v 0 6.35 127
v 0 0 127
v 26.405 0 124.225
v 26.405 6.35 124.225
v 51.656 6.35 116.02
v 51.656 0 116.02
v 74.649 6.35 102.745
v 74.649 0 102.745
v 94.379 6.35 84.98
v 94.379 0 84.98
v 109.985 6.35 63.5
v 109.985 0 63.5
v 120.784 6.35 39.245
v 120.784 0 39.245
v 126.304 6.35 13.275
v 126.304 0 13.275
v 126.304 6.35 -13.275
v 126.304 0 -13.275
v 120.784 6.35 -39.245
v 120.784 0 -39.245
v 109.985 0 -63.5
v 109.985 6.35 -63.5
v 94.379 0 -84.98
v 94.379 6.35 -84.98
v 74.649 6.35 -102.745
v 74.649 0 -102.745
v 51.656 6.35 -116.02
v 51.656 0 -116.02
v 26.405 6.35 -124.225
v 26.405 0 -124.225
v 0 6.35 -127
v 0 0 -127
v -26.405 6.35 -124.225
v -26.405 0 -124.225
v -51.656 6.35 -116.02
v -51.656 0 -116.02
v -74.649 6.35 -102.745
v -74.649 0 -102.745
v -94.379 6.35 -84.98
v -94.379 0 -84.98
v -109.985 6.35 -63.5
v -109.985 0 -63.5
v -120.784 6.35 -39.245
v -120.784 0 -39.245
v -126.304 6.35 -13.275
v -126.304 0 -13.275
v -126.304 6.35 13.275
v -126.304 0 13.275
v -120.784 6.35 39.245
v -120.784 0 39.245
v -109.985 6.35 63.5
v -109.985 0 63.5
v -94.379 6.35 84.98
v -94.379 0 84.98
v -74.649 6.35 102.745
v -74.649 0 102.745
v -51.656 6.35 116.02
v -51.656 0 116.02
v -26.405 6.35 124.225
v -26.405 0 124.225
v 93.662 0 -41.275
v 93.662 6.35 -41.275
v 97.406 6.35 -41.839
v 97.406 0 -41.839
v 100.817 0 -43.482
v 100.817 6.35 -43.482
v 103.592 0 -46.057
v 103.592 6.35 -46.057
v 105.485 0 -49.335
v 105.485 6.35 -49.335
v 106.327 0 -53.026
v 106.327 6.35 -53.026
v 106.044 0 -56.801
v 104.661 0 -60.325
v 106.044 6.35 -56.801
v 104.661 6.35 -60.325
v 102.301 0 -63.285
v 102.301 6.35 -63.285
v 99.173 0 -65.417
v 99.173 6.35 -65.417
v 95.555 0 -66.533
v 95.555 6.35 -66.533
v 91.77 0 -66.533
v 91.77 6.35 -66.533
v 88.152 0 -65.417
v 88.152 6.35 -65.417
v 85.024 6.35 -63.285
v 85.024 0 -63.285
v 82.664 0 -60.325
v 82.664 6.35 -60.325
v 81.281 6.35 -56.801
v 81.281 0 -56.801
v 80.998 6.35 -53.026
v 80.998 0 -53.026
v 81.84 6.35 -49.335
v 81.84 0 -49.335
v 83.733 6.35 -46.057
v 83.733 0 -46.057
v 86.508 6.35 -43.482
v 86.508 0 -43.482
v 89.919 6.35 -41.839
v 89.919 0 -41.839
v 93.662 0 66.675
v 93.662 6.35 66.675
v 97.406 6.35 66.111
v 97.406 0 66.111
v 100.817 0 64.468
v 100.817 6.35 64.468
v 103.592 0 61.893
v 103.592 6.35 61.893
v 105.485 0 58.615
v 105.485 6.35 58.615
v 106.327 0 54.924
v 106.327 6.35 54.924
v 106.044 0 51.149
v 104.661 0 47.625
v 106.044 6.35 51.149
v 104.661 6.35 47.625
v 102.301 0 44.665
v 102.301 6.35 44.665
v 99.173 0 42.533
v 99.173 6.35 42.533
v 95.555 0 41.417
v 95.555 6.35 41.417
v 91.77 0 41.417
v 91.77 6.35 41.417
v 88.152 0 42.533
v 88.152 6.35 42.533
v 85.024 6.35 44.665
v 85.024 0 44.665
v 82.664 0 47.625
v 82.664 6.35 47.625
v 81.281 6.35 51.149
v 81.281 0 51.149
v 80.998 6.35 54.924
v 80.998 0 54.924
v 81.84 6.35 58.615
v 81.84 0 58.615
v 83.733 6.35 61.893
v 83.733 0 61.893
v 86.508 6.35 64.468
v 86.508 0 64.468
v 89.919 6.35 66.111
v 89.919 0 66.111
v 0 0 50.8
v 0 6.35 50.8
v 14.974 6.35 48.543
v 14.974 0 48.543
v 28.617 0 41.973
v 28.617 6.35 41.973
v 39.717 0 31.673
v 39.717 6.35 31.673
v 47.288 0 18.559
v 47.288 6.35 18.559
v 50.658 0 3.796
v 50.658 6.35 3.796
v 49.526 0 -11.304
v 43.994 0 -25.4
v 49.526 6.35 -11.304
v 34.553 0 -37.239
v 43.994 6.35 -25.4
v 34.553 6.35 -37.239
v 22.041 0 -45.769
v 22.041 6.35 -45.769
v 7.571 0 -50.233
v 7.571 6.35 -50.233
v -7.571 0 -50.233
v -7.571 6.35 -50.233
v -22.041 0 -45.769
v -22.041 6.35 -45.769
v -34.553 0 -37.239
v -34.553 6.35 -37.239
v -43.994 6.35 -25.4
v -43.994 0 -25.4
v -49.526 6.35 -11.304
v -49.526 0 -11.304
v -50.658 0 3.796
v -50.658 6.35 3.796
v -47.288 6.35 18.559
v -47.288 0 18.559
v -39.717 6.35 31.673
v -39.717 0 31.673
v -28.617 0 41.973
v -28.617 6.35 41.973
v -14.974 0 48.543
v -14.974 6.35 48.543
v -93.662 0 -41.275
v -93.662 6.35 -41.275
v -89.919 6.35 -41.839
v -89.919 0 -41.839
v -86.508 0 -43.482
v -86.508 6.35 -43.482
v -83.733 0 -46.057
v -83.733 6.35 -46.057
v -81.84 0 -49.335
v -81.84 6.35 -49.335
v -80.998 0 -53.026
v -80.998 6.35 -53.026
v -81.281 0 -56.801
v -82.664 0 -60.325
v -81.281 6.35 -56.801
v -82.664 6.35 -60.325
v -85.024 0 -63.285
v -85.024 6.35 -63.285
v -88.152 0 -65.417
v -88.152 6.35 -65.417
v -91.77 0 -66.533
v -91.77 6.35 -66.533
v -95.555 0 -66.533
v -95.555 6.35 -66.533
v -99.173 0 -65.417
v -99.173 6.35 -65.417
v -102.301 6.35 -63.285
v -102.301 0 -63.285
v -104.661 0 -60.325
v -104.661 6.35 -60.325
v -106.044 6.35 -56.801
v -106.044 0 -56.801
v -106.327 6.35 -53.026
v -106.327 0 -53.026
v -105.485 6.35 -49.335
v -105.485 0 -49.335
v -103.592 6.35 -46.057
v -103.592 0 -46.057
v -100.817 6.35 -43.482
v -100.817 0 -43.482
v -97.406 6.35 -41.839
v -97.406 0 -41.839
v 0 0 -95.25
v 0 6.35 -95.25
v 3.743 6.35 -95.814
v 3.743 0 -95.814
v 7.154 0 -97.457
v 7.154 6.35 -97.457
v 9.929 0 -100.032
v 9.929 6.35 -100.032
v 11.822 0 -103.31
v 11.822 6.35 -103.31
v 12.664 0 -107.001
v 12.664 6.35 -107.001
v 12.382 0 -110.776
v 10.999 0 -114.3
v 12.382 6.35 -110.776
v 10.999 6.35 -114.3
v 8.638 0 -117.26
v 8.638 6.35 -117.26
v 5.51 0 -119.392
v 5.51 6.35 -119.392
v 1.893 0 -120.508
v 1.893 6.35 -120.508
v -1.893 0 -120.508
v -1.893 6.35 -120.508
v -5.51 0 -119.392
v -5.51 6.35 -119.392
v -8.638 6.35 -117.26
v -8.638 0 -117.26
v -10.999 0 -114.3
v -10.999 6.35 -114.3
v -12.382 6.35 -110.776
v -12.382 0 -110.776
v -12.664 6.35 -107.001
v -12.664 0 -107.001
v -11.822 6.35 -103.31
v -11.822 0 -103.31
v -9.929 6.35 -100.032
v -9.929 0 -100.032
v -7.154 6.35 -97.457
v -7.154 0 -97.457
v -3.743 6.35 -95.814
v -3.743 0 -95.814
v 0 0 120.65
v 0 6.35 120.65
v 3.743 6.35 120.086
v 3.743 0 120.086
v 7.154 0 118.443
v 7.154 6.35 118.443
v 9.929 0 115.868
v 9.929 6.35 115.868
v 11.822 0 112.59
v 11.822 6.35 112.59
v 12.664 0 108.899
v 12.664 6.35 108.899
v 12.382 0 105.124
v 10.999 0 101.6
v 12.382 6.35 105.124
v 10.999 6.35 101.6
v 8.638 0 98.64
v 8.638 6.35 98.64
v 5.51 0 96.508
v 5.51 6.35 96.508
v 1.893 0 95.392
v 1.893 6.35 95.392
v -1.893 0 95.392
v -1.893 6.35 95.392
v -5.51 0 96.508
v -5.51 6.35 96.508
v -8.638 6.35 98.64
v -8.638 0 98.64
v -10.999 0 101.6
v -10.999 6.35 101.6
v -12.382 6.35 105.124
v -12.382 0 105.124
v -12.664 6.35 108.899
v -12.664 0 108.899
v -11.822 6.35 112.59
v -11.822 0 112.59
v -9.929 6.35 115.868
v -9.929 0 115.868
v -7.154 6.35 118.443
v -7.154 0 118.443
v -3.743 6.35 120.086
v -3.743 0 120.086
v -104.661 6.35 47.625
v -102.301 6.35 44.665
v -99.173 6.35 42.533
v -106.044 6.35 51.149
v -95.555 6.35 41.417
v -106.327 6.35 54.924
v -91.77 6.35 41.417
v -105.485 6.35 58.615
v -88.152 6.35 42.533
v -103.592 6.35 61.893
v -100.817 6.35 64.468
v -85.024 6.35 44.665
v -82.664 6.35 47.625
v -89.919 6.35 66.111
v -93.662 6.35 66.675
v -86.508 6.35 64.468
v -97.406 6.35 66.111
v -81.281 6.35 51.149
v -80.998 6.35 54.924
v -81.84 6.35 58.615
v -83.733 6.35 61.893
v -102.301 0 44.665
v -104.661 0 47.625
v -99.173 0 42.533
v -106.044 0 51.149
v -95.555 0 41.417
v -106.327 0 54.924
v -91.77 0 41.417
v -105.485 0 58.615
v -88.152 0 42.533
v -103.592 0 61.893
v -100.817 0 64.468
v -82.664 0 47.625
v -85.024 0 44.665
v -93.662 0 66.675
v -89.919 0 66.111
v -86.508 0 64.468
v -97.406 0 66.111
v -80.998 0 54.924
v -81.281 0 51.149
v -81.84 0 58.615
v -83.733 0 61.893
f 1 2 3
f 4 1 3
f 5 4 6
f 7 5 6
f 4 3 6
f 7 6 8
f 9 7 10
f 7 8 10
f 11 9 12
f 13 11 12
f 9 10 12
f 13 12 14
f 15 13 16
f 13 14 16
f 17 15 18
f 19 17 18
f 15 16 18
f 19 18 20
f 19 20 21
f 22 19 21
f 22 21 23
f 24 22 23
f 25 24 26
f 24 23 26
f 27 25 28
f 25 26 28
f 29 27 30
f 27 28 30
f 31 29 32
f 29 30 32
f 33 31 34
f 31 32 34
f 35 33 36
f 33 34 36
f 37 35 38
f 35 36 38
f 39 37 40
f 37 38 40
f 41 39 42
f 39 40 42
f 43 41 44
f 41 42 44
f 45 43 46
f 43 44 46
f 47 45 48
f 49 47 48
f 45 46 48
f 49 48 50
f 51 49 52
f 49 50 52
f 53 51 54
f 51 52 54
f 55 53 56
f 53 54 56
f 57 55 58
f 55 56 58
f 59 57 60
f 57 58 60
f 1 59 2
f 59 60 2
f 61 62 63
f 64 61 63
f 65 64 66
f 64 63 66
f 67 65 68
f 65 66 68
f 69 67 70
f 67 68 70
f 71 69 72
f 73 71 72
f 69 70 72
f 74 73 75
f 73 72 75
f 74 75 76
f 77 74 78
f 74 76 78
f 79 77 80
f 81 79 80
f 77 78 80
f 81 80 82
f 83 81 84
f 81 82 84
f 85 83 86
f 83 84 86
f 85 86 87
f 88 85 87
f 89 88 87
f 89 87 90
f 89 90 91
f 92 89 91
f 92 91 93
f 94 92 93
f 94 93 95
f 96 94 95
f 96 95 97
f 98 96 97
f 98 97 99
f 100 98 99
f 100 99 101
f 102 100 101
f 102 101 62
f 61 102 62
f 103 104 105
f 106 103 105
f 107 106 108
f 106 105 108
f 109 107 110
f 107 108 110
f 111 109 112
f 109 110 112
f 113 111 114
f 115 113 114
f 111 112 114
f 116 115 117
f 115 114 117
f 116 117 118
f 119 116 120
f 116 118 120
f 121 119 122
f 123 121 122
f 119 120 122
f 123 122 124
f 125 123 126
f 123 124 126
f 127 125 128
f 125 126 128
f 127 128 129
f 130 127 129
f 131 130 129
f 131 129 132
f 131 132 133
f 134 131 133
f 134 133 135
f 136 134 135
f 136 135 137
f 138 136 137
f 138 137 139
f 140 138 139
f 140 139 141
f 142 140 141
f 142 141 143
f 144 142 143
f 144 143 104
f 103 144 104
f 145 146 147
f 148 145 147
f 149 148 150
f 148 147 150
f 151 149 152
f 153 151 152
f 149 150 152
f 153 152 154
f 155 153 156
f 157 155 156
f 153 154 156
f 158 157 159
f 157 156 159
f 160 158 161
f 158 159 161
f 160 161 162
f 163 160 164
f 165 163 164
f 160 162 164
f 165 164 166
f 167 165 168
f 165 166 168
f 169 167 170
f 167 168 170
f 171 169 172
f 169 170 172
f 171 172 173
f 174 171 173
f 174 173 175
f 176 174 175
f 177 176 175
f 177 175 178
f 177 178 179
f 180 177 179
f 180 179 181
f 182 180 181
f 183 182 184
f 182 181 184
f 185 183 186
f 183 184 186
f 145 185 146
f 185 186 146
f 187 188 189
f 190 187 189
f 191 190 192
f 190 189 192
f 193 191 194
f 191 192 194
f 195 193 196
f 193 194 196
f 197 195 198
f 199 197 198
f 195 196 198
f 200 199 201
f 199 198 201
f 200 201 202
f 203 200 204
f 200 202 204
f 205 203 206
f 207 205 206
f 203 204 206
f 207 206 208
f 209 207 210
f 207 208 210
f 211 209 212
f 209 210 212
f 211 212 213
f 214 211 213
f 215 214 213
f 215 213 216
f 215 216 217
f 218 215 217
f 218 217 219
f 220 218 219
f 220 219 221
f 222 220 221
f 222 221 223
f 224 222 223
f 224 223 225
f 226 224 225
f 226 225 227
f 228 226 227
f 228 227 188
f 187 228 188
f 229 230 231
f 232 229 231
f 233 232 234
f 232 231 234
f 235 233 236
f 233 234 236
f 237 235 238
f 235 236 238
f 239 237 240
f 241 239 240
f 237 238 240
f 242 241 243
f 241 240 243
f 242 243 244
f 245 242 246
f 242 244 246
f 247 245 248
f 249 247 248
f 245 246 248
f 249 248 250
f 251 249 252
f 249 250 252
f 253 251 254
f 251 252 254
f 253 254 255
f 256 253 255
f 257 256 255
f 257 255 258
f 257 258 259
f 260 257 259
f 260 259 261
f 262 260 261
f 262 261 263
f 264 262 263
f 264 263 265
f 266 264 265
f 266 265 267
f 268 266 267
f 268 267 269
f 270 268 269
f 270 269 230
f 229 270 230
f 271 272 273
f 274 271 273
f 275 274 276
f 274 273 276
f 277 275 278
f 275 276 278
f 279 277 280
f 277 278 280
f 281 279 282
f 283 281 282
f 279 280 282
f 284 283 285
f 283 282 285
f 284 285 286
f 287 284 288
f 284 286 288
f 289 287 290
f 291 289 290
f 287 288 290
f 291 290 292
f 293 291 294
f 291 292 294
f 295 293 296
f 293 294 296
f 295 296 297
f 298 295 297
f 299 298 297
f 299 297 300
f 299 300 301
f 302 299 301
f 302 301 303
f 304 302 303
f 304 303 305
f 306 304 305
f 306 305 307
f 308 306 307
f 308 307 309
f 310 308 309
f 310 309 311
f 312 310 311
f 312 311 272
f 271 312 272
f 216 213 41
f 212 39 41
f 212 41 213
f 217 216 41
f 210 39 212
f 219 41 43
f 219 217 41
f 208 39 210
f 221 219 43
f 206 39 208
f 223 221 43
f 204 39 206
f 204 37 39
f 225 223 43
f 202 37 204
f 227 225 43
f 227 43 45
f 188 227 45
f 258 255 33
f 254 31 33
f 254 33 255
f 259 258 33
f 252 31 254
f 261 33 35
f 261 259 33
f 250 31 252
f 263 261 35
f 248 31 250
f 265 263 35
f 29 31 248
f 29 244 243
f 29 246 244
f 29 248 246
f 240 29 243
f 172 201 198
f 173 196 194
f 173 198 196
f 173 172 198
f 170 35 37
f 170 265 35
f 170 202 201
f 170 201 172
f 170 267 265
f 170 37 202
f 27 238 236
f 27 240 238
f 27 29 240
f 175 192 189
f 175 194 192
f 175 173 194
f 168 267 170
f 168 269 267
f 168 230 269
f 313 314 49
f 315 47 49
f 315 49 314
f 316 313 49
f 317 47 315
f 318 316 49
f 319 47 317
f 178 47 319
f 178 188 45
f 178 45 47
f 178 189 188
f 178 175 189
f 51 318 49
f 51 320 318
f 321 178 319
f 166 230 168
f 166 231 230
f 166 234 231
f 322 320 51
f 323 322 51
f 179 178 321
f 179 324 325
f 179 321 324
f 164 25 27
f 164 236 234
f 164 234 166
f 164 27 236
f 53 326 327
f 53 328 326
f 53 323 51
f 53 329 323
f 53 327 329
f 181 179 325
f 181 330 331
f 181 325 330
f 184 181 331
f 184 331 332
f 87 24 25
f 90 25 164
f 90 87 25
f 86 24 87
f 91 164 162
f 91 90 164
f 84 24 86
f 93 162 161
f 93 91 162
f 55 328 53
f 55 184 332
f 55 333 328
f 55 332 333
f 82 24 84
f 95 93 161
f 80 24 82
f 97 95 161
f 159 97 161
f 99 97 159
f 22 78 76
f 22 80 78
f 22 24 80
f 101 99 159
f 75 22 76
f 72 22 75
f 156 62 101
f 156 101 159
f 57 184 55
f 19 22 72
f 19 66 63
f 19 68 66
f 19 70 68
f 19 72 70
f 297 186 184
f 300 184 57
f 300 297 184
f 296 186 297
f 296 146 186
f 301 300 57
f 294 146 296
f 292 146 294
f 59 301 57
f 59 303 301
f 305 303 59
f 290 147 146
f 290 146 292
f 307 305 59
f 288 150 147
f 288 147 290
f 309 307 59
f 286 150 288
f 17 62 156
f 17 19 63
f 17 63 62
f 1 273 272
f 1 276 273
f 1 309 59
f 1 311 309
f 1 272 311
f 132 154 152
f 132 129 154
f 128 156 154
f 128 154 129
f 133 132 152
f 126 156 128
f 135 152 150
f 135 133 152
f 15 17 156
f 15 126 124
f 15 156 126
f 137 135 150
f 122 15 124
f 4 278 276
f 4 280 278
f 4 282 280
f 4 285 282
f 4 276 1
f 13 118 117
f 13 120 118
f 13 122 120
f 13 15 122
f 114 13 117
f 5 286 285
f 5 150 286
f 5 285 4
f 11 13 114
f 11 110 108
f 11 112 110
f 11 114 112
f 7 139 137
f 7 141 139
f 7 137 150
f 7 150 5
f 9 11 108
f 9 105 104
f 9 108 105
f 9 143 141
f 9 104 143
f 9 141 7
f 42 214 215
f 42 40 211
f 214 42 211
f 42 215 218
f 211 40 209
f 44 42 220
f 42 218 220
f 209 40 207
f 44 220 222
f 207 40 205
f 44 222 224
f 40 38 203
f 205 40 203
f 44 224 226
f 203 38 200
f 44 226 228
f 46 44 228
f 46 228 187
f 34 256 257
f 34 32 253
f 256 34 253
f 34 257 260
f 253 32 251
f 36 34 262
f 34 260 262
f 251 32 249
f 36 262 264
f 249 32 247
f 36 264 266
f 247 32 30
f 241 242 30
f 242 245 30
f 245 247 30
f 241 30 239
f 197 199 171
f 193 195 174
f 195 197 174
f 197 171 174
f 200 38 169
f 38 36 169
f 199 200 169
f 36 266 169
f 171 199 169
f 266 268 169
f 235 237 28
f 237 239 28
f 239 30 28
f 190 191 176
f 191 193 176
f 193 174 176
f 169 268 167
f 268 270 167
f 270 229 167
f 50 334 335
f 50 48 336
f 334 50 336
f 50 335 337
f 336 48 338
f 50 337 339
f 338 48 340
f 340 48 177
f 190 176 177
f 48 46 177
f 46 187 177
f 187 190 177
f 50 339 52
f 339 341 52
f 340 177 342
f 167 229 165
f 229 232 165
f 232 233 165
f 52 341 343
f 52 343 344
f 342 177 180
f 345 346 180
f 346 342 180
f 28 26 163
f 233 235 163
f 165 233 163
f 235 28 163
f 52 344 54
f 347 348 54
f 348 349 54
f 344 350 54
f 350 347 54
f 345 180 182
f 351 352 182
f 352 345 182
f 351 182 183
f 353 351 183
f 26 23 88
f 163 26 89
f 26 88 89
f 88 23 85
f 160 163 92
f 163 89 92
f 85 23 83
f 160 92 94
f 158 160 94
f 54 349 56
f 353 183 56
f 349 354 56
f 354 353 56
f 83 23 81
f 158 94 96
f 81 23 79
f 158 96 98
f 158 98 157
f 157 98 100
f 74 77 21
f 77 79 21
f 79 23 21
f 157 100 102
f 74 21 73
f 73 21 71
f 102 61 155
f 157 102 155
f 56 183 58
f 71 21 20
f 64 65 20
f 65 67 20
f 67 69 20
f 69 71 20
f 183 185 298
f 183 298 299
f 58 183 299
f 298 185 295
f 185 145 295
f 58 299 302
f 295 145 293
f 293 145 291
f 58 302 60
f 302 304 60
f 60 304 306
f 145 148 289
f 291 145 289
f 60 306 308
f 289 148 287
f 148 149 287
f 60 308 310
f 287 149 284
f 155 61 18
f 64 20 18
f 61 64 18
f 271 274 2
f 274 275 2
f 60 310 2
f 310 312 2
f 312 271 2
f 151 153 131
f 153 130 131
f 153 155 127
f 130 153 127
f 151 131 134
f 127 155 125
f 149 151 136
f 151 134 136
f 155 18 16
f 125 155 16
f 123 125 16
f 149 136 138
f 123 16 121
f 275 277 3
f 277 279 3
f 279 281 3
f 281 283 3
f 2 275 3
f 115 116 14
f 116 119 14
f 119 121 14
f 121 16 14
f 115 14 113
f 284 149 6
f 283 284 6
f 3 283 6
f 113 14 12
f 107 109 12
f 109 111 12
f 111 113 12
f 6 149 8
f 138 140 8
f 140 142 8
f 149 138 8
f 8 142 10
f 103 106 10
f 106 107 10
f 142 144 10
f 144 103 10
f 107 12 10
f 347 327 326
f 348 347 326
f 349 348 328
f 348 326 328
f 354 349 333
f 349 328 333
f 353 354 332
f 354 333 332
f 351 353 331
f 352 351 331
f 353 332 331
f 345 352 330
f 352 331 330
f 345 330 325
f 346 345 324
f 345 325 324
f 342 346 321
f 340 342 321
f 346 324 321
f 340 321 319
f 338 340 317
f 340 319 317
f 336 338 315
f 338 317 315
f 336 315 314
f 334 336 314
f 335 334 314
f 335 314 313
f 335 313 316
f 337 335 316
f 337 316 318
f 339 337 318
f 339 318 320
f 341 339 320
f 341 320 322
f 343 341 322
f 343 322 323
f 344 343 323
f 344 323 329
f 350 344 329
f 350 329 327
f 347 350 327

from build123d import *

# Parameters (mm, degrees)
SKETCH1_R           = 127
BOSS_EXTRUDE1_DEPTH = 6.35
SKETCH2_R           = 50.8
CUT_EXTRUDE1_DEPTH  = 6.35
SKETCH4_R           = 12.7
CUT_EXTRUDE4_DEPTH  = 12.7


with BuildPart() as part:
    # Sketch1 → Boss-Extrude1 (new body)
    with BuildSketch(Plane(origin=(0, 0, 0), x_dir=(1, 0, 0), z_dir=(0, 1, 0))):
        with Locations(Location((0, 0, 0), (0, 0, 270))):
            Circle(SKETCH1_R)
    extrude(amount=BOSS_EXTRUDE1_DEPTH)

    # Sketch2 → Cut-Extrude1 (cut)
    with BuildSketch(Plane(origin=(0, 6.35, 0), x_dir=(1, 0, 0), z_dir=(0, 1, 0))):
        with Locations(Location((0, 0, 0), (0, 0, 270))):
            Circle(SKETCH2_R)
    extrude(amount=-CUT_EXTRUDE1_DEPTH, mode=Mode.SUBTRACT)

    # Sketch4 → Cut-Extrude4 (cut)
    with BuildSketch(Plane(origin=(0, 6.35, 0), x_dir=(1, 0, 0), z_dir=(0, 1, 0))):
        with Locations(Location((0, 107.95, 0), (0, 0, 270))):
            Circle(SKETCH4_R)
        with Locations(Location((93.6625, 53.975, 0), (0, 0, 270))):
            Circle(SKETCH4_R)
        with Locations(Location((0, -107.95, 0), (0, 0, 270))):
            Circle(SKETCH4_R)
        with Locations(Location((-93.6625, 53.975, 0), (0, 0, 270))):
            Circle(SKETCH4_R)
        with Locations(Location((-93.6625, -53.975, 0), (0, 0, 270))):
            Circle(SKETCH4_R)
        with Locations(Location((93.6625, -53.975, 0), (0, 0, 270))):
            Circle(SKETCH4_R)
    extrude(amount=-CUT_EXTRUDE4_DEPTH, mode=Mode.SUBTRACT)


solid = part.part
